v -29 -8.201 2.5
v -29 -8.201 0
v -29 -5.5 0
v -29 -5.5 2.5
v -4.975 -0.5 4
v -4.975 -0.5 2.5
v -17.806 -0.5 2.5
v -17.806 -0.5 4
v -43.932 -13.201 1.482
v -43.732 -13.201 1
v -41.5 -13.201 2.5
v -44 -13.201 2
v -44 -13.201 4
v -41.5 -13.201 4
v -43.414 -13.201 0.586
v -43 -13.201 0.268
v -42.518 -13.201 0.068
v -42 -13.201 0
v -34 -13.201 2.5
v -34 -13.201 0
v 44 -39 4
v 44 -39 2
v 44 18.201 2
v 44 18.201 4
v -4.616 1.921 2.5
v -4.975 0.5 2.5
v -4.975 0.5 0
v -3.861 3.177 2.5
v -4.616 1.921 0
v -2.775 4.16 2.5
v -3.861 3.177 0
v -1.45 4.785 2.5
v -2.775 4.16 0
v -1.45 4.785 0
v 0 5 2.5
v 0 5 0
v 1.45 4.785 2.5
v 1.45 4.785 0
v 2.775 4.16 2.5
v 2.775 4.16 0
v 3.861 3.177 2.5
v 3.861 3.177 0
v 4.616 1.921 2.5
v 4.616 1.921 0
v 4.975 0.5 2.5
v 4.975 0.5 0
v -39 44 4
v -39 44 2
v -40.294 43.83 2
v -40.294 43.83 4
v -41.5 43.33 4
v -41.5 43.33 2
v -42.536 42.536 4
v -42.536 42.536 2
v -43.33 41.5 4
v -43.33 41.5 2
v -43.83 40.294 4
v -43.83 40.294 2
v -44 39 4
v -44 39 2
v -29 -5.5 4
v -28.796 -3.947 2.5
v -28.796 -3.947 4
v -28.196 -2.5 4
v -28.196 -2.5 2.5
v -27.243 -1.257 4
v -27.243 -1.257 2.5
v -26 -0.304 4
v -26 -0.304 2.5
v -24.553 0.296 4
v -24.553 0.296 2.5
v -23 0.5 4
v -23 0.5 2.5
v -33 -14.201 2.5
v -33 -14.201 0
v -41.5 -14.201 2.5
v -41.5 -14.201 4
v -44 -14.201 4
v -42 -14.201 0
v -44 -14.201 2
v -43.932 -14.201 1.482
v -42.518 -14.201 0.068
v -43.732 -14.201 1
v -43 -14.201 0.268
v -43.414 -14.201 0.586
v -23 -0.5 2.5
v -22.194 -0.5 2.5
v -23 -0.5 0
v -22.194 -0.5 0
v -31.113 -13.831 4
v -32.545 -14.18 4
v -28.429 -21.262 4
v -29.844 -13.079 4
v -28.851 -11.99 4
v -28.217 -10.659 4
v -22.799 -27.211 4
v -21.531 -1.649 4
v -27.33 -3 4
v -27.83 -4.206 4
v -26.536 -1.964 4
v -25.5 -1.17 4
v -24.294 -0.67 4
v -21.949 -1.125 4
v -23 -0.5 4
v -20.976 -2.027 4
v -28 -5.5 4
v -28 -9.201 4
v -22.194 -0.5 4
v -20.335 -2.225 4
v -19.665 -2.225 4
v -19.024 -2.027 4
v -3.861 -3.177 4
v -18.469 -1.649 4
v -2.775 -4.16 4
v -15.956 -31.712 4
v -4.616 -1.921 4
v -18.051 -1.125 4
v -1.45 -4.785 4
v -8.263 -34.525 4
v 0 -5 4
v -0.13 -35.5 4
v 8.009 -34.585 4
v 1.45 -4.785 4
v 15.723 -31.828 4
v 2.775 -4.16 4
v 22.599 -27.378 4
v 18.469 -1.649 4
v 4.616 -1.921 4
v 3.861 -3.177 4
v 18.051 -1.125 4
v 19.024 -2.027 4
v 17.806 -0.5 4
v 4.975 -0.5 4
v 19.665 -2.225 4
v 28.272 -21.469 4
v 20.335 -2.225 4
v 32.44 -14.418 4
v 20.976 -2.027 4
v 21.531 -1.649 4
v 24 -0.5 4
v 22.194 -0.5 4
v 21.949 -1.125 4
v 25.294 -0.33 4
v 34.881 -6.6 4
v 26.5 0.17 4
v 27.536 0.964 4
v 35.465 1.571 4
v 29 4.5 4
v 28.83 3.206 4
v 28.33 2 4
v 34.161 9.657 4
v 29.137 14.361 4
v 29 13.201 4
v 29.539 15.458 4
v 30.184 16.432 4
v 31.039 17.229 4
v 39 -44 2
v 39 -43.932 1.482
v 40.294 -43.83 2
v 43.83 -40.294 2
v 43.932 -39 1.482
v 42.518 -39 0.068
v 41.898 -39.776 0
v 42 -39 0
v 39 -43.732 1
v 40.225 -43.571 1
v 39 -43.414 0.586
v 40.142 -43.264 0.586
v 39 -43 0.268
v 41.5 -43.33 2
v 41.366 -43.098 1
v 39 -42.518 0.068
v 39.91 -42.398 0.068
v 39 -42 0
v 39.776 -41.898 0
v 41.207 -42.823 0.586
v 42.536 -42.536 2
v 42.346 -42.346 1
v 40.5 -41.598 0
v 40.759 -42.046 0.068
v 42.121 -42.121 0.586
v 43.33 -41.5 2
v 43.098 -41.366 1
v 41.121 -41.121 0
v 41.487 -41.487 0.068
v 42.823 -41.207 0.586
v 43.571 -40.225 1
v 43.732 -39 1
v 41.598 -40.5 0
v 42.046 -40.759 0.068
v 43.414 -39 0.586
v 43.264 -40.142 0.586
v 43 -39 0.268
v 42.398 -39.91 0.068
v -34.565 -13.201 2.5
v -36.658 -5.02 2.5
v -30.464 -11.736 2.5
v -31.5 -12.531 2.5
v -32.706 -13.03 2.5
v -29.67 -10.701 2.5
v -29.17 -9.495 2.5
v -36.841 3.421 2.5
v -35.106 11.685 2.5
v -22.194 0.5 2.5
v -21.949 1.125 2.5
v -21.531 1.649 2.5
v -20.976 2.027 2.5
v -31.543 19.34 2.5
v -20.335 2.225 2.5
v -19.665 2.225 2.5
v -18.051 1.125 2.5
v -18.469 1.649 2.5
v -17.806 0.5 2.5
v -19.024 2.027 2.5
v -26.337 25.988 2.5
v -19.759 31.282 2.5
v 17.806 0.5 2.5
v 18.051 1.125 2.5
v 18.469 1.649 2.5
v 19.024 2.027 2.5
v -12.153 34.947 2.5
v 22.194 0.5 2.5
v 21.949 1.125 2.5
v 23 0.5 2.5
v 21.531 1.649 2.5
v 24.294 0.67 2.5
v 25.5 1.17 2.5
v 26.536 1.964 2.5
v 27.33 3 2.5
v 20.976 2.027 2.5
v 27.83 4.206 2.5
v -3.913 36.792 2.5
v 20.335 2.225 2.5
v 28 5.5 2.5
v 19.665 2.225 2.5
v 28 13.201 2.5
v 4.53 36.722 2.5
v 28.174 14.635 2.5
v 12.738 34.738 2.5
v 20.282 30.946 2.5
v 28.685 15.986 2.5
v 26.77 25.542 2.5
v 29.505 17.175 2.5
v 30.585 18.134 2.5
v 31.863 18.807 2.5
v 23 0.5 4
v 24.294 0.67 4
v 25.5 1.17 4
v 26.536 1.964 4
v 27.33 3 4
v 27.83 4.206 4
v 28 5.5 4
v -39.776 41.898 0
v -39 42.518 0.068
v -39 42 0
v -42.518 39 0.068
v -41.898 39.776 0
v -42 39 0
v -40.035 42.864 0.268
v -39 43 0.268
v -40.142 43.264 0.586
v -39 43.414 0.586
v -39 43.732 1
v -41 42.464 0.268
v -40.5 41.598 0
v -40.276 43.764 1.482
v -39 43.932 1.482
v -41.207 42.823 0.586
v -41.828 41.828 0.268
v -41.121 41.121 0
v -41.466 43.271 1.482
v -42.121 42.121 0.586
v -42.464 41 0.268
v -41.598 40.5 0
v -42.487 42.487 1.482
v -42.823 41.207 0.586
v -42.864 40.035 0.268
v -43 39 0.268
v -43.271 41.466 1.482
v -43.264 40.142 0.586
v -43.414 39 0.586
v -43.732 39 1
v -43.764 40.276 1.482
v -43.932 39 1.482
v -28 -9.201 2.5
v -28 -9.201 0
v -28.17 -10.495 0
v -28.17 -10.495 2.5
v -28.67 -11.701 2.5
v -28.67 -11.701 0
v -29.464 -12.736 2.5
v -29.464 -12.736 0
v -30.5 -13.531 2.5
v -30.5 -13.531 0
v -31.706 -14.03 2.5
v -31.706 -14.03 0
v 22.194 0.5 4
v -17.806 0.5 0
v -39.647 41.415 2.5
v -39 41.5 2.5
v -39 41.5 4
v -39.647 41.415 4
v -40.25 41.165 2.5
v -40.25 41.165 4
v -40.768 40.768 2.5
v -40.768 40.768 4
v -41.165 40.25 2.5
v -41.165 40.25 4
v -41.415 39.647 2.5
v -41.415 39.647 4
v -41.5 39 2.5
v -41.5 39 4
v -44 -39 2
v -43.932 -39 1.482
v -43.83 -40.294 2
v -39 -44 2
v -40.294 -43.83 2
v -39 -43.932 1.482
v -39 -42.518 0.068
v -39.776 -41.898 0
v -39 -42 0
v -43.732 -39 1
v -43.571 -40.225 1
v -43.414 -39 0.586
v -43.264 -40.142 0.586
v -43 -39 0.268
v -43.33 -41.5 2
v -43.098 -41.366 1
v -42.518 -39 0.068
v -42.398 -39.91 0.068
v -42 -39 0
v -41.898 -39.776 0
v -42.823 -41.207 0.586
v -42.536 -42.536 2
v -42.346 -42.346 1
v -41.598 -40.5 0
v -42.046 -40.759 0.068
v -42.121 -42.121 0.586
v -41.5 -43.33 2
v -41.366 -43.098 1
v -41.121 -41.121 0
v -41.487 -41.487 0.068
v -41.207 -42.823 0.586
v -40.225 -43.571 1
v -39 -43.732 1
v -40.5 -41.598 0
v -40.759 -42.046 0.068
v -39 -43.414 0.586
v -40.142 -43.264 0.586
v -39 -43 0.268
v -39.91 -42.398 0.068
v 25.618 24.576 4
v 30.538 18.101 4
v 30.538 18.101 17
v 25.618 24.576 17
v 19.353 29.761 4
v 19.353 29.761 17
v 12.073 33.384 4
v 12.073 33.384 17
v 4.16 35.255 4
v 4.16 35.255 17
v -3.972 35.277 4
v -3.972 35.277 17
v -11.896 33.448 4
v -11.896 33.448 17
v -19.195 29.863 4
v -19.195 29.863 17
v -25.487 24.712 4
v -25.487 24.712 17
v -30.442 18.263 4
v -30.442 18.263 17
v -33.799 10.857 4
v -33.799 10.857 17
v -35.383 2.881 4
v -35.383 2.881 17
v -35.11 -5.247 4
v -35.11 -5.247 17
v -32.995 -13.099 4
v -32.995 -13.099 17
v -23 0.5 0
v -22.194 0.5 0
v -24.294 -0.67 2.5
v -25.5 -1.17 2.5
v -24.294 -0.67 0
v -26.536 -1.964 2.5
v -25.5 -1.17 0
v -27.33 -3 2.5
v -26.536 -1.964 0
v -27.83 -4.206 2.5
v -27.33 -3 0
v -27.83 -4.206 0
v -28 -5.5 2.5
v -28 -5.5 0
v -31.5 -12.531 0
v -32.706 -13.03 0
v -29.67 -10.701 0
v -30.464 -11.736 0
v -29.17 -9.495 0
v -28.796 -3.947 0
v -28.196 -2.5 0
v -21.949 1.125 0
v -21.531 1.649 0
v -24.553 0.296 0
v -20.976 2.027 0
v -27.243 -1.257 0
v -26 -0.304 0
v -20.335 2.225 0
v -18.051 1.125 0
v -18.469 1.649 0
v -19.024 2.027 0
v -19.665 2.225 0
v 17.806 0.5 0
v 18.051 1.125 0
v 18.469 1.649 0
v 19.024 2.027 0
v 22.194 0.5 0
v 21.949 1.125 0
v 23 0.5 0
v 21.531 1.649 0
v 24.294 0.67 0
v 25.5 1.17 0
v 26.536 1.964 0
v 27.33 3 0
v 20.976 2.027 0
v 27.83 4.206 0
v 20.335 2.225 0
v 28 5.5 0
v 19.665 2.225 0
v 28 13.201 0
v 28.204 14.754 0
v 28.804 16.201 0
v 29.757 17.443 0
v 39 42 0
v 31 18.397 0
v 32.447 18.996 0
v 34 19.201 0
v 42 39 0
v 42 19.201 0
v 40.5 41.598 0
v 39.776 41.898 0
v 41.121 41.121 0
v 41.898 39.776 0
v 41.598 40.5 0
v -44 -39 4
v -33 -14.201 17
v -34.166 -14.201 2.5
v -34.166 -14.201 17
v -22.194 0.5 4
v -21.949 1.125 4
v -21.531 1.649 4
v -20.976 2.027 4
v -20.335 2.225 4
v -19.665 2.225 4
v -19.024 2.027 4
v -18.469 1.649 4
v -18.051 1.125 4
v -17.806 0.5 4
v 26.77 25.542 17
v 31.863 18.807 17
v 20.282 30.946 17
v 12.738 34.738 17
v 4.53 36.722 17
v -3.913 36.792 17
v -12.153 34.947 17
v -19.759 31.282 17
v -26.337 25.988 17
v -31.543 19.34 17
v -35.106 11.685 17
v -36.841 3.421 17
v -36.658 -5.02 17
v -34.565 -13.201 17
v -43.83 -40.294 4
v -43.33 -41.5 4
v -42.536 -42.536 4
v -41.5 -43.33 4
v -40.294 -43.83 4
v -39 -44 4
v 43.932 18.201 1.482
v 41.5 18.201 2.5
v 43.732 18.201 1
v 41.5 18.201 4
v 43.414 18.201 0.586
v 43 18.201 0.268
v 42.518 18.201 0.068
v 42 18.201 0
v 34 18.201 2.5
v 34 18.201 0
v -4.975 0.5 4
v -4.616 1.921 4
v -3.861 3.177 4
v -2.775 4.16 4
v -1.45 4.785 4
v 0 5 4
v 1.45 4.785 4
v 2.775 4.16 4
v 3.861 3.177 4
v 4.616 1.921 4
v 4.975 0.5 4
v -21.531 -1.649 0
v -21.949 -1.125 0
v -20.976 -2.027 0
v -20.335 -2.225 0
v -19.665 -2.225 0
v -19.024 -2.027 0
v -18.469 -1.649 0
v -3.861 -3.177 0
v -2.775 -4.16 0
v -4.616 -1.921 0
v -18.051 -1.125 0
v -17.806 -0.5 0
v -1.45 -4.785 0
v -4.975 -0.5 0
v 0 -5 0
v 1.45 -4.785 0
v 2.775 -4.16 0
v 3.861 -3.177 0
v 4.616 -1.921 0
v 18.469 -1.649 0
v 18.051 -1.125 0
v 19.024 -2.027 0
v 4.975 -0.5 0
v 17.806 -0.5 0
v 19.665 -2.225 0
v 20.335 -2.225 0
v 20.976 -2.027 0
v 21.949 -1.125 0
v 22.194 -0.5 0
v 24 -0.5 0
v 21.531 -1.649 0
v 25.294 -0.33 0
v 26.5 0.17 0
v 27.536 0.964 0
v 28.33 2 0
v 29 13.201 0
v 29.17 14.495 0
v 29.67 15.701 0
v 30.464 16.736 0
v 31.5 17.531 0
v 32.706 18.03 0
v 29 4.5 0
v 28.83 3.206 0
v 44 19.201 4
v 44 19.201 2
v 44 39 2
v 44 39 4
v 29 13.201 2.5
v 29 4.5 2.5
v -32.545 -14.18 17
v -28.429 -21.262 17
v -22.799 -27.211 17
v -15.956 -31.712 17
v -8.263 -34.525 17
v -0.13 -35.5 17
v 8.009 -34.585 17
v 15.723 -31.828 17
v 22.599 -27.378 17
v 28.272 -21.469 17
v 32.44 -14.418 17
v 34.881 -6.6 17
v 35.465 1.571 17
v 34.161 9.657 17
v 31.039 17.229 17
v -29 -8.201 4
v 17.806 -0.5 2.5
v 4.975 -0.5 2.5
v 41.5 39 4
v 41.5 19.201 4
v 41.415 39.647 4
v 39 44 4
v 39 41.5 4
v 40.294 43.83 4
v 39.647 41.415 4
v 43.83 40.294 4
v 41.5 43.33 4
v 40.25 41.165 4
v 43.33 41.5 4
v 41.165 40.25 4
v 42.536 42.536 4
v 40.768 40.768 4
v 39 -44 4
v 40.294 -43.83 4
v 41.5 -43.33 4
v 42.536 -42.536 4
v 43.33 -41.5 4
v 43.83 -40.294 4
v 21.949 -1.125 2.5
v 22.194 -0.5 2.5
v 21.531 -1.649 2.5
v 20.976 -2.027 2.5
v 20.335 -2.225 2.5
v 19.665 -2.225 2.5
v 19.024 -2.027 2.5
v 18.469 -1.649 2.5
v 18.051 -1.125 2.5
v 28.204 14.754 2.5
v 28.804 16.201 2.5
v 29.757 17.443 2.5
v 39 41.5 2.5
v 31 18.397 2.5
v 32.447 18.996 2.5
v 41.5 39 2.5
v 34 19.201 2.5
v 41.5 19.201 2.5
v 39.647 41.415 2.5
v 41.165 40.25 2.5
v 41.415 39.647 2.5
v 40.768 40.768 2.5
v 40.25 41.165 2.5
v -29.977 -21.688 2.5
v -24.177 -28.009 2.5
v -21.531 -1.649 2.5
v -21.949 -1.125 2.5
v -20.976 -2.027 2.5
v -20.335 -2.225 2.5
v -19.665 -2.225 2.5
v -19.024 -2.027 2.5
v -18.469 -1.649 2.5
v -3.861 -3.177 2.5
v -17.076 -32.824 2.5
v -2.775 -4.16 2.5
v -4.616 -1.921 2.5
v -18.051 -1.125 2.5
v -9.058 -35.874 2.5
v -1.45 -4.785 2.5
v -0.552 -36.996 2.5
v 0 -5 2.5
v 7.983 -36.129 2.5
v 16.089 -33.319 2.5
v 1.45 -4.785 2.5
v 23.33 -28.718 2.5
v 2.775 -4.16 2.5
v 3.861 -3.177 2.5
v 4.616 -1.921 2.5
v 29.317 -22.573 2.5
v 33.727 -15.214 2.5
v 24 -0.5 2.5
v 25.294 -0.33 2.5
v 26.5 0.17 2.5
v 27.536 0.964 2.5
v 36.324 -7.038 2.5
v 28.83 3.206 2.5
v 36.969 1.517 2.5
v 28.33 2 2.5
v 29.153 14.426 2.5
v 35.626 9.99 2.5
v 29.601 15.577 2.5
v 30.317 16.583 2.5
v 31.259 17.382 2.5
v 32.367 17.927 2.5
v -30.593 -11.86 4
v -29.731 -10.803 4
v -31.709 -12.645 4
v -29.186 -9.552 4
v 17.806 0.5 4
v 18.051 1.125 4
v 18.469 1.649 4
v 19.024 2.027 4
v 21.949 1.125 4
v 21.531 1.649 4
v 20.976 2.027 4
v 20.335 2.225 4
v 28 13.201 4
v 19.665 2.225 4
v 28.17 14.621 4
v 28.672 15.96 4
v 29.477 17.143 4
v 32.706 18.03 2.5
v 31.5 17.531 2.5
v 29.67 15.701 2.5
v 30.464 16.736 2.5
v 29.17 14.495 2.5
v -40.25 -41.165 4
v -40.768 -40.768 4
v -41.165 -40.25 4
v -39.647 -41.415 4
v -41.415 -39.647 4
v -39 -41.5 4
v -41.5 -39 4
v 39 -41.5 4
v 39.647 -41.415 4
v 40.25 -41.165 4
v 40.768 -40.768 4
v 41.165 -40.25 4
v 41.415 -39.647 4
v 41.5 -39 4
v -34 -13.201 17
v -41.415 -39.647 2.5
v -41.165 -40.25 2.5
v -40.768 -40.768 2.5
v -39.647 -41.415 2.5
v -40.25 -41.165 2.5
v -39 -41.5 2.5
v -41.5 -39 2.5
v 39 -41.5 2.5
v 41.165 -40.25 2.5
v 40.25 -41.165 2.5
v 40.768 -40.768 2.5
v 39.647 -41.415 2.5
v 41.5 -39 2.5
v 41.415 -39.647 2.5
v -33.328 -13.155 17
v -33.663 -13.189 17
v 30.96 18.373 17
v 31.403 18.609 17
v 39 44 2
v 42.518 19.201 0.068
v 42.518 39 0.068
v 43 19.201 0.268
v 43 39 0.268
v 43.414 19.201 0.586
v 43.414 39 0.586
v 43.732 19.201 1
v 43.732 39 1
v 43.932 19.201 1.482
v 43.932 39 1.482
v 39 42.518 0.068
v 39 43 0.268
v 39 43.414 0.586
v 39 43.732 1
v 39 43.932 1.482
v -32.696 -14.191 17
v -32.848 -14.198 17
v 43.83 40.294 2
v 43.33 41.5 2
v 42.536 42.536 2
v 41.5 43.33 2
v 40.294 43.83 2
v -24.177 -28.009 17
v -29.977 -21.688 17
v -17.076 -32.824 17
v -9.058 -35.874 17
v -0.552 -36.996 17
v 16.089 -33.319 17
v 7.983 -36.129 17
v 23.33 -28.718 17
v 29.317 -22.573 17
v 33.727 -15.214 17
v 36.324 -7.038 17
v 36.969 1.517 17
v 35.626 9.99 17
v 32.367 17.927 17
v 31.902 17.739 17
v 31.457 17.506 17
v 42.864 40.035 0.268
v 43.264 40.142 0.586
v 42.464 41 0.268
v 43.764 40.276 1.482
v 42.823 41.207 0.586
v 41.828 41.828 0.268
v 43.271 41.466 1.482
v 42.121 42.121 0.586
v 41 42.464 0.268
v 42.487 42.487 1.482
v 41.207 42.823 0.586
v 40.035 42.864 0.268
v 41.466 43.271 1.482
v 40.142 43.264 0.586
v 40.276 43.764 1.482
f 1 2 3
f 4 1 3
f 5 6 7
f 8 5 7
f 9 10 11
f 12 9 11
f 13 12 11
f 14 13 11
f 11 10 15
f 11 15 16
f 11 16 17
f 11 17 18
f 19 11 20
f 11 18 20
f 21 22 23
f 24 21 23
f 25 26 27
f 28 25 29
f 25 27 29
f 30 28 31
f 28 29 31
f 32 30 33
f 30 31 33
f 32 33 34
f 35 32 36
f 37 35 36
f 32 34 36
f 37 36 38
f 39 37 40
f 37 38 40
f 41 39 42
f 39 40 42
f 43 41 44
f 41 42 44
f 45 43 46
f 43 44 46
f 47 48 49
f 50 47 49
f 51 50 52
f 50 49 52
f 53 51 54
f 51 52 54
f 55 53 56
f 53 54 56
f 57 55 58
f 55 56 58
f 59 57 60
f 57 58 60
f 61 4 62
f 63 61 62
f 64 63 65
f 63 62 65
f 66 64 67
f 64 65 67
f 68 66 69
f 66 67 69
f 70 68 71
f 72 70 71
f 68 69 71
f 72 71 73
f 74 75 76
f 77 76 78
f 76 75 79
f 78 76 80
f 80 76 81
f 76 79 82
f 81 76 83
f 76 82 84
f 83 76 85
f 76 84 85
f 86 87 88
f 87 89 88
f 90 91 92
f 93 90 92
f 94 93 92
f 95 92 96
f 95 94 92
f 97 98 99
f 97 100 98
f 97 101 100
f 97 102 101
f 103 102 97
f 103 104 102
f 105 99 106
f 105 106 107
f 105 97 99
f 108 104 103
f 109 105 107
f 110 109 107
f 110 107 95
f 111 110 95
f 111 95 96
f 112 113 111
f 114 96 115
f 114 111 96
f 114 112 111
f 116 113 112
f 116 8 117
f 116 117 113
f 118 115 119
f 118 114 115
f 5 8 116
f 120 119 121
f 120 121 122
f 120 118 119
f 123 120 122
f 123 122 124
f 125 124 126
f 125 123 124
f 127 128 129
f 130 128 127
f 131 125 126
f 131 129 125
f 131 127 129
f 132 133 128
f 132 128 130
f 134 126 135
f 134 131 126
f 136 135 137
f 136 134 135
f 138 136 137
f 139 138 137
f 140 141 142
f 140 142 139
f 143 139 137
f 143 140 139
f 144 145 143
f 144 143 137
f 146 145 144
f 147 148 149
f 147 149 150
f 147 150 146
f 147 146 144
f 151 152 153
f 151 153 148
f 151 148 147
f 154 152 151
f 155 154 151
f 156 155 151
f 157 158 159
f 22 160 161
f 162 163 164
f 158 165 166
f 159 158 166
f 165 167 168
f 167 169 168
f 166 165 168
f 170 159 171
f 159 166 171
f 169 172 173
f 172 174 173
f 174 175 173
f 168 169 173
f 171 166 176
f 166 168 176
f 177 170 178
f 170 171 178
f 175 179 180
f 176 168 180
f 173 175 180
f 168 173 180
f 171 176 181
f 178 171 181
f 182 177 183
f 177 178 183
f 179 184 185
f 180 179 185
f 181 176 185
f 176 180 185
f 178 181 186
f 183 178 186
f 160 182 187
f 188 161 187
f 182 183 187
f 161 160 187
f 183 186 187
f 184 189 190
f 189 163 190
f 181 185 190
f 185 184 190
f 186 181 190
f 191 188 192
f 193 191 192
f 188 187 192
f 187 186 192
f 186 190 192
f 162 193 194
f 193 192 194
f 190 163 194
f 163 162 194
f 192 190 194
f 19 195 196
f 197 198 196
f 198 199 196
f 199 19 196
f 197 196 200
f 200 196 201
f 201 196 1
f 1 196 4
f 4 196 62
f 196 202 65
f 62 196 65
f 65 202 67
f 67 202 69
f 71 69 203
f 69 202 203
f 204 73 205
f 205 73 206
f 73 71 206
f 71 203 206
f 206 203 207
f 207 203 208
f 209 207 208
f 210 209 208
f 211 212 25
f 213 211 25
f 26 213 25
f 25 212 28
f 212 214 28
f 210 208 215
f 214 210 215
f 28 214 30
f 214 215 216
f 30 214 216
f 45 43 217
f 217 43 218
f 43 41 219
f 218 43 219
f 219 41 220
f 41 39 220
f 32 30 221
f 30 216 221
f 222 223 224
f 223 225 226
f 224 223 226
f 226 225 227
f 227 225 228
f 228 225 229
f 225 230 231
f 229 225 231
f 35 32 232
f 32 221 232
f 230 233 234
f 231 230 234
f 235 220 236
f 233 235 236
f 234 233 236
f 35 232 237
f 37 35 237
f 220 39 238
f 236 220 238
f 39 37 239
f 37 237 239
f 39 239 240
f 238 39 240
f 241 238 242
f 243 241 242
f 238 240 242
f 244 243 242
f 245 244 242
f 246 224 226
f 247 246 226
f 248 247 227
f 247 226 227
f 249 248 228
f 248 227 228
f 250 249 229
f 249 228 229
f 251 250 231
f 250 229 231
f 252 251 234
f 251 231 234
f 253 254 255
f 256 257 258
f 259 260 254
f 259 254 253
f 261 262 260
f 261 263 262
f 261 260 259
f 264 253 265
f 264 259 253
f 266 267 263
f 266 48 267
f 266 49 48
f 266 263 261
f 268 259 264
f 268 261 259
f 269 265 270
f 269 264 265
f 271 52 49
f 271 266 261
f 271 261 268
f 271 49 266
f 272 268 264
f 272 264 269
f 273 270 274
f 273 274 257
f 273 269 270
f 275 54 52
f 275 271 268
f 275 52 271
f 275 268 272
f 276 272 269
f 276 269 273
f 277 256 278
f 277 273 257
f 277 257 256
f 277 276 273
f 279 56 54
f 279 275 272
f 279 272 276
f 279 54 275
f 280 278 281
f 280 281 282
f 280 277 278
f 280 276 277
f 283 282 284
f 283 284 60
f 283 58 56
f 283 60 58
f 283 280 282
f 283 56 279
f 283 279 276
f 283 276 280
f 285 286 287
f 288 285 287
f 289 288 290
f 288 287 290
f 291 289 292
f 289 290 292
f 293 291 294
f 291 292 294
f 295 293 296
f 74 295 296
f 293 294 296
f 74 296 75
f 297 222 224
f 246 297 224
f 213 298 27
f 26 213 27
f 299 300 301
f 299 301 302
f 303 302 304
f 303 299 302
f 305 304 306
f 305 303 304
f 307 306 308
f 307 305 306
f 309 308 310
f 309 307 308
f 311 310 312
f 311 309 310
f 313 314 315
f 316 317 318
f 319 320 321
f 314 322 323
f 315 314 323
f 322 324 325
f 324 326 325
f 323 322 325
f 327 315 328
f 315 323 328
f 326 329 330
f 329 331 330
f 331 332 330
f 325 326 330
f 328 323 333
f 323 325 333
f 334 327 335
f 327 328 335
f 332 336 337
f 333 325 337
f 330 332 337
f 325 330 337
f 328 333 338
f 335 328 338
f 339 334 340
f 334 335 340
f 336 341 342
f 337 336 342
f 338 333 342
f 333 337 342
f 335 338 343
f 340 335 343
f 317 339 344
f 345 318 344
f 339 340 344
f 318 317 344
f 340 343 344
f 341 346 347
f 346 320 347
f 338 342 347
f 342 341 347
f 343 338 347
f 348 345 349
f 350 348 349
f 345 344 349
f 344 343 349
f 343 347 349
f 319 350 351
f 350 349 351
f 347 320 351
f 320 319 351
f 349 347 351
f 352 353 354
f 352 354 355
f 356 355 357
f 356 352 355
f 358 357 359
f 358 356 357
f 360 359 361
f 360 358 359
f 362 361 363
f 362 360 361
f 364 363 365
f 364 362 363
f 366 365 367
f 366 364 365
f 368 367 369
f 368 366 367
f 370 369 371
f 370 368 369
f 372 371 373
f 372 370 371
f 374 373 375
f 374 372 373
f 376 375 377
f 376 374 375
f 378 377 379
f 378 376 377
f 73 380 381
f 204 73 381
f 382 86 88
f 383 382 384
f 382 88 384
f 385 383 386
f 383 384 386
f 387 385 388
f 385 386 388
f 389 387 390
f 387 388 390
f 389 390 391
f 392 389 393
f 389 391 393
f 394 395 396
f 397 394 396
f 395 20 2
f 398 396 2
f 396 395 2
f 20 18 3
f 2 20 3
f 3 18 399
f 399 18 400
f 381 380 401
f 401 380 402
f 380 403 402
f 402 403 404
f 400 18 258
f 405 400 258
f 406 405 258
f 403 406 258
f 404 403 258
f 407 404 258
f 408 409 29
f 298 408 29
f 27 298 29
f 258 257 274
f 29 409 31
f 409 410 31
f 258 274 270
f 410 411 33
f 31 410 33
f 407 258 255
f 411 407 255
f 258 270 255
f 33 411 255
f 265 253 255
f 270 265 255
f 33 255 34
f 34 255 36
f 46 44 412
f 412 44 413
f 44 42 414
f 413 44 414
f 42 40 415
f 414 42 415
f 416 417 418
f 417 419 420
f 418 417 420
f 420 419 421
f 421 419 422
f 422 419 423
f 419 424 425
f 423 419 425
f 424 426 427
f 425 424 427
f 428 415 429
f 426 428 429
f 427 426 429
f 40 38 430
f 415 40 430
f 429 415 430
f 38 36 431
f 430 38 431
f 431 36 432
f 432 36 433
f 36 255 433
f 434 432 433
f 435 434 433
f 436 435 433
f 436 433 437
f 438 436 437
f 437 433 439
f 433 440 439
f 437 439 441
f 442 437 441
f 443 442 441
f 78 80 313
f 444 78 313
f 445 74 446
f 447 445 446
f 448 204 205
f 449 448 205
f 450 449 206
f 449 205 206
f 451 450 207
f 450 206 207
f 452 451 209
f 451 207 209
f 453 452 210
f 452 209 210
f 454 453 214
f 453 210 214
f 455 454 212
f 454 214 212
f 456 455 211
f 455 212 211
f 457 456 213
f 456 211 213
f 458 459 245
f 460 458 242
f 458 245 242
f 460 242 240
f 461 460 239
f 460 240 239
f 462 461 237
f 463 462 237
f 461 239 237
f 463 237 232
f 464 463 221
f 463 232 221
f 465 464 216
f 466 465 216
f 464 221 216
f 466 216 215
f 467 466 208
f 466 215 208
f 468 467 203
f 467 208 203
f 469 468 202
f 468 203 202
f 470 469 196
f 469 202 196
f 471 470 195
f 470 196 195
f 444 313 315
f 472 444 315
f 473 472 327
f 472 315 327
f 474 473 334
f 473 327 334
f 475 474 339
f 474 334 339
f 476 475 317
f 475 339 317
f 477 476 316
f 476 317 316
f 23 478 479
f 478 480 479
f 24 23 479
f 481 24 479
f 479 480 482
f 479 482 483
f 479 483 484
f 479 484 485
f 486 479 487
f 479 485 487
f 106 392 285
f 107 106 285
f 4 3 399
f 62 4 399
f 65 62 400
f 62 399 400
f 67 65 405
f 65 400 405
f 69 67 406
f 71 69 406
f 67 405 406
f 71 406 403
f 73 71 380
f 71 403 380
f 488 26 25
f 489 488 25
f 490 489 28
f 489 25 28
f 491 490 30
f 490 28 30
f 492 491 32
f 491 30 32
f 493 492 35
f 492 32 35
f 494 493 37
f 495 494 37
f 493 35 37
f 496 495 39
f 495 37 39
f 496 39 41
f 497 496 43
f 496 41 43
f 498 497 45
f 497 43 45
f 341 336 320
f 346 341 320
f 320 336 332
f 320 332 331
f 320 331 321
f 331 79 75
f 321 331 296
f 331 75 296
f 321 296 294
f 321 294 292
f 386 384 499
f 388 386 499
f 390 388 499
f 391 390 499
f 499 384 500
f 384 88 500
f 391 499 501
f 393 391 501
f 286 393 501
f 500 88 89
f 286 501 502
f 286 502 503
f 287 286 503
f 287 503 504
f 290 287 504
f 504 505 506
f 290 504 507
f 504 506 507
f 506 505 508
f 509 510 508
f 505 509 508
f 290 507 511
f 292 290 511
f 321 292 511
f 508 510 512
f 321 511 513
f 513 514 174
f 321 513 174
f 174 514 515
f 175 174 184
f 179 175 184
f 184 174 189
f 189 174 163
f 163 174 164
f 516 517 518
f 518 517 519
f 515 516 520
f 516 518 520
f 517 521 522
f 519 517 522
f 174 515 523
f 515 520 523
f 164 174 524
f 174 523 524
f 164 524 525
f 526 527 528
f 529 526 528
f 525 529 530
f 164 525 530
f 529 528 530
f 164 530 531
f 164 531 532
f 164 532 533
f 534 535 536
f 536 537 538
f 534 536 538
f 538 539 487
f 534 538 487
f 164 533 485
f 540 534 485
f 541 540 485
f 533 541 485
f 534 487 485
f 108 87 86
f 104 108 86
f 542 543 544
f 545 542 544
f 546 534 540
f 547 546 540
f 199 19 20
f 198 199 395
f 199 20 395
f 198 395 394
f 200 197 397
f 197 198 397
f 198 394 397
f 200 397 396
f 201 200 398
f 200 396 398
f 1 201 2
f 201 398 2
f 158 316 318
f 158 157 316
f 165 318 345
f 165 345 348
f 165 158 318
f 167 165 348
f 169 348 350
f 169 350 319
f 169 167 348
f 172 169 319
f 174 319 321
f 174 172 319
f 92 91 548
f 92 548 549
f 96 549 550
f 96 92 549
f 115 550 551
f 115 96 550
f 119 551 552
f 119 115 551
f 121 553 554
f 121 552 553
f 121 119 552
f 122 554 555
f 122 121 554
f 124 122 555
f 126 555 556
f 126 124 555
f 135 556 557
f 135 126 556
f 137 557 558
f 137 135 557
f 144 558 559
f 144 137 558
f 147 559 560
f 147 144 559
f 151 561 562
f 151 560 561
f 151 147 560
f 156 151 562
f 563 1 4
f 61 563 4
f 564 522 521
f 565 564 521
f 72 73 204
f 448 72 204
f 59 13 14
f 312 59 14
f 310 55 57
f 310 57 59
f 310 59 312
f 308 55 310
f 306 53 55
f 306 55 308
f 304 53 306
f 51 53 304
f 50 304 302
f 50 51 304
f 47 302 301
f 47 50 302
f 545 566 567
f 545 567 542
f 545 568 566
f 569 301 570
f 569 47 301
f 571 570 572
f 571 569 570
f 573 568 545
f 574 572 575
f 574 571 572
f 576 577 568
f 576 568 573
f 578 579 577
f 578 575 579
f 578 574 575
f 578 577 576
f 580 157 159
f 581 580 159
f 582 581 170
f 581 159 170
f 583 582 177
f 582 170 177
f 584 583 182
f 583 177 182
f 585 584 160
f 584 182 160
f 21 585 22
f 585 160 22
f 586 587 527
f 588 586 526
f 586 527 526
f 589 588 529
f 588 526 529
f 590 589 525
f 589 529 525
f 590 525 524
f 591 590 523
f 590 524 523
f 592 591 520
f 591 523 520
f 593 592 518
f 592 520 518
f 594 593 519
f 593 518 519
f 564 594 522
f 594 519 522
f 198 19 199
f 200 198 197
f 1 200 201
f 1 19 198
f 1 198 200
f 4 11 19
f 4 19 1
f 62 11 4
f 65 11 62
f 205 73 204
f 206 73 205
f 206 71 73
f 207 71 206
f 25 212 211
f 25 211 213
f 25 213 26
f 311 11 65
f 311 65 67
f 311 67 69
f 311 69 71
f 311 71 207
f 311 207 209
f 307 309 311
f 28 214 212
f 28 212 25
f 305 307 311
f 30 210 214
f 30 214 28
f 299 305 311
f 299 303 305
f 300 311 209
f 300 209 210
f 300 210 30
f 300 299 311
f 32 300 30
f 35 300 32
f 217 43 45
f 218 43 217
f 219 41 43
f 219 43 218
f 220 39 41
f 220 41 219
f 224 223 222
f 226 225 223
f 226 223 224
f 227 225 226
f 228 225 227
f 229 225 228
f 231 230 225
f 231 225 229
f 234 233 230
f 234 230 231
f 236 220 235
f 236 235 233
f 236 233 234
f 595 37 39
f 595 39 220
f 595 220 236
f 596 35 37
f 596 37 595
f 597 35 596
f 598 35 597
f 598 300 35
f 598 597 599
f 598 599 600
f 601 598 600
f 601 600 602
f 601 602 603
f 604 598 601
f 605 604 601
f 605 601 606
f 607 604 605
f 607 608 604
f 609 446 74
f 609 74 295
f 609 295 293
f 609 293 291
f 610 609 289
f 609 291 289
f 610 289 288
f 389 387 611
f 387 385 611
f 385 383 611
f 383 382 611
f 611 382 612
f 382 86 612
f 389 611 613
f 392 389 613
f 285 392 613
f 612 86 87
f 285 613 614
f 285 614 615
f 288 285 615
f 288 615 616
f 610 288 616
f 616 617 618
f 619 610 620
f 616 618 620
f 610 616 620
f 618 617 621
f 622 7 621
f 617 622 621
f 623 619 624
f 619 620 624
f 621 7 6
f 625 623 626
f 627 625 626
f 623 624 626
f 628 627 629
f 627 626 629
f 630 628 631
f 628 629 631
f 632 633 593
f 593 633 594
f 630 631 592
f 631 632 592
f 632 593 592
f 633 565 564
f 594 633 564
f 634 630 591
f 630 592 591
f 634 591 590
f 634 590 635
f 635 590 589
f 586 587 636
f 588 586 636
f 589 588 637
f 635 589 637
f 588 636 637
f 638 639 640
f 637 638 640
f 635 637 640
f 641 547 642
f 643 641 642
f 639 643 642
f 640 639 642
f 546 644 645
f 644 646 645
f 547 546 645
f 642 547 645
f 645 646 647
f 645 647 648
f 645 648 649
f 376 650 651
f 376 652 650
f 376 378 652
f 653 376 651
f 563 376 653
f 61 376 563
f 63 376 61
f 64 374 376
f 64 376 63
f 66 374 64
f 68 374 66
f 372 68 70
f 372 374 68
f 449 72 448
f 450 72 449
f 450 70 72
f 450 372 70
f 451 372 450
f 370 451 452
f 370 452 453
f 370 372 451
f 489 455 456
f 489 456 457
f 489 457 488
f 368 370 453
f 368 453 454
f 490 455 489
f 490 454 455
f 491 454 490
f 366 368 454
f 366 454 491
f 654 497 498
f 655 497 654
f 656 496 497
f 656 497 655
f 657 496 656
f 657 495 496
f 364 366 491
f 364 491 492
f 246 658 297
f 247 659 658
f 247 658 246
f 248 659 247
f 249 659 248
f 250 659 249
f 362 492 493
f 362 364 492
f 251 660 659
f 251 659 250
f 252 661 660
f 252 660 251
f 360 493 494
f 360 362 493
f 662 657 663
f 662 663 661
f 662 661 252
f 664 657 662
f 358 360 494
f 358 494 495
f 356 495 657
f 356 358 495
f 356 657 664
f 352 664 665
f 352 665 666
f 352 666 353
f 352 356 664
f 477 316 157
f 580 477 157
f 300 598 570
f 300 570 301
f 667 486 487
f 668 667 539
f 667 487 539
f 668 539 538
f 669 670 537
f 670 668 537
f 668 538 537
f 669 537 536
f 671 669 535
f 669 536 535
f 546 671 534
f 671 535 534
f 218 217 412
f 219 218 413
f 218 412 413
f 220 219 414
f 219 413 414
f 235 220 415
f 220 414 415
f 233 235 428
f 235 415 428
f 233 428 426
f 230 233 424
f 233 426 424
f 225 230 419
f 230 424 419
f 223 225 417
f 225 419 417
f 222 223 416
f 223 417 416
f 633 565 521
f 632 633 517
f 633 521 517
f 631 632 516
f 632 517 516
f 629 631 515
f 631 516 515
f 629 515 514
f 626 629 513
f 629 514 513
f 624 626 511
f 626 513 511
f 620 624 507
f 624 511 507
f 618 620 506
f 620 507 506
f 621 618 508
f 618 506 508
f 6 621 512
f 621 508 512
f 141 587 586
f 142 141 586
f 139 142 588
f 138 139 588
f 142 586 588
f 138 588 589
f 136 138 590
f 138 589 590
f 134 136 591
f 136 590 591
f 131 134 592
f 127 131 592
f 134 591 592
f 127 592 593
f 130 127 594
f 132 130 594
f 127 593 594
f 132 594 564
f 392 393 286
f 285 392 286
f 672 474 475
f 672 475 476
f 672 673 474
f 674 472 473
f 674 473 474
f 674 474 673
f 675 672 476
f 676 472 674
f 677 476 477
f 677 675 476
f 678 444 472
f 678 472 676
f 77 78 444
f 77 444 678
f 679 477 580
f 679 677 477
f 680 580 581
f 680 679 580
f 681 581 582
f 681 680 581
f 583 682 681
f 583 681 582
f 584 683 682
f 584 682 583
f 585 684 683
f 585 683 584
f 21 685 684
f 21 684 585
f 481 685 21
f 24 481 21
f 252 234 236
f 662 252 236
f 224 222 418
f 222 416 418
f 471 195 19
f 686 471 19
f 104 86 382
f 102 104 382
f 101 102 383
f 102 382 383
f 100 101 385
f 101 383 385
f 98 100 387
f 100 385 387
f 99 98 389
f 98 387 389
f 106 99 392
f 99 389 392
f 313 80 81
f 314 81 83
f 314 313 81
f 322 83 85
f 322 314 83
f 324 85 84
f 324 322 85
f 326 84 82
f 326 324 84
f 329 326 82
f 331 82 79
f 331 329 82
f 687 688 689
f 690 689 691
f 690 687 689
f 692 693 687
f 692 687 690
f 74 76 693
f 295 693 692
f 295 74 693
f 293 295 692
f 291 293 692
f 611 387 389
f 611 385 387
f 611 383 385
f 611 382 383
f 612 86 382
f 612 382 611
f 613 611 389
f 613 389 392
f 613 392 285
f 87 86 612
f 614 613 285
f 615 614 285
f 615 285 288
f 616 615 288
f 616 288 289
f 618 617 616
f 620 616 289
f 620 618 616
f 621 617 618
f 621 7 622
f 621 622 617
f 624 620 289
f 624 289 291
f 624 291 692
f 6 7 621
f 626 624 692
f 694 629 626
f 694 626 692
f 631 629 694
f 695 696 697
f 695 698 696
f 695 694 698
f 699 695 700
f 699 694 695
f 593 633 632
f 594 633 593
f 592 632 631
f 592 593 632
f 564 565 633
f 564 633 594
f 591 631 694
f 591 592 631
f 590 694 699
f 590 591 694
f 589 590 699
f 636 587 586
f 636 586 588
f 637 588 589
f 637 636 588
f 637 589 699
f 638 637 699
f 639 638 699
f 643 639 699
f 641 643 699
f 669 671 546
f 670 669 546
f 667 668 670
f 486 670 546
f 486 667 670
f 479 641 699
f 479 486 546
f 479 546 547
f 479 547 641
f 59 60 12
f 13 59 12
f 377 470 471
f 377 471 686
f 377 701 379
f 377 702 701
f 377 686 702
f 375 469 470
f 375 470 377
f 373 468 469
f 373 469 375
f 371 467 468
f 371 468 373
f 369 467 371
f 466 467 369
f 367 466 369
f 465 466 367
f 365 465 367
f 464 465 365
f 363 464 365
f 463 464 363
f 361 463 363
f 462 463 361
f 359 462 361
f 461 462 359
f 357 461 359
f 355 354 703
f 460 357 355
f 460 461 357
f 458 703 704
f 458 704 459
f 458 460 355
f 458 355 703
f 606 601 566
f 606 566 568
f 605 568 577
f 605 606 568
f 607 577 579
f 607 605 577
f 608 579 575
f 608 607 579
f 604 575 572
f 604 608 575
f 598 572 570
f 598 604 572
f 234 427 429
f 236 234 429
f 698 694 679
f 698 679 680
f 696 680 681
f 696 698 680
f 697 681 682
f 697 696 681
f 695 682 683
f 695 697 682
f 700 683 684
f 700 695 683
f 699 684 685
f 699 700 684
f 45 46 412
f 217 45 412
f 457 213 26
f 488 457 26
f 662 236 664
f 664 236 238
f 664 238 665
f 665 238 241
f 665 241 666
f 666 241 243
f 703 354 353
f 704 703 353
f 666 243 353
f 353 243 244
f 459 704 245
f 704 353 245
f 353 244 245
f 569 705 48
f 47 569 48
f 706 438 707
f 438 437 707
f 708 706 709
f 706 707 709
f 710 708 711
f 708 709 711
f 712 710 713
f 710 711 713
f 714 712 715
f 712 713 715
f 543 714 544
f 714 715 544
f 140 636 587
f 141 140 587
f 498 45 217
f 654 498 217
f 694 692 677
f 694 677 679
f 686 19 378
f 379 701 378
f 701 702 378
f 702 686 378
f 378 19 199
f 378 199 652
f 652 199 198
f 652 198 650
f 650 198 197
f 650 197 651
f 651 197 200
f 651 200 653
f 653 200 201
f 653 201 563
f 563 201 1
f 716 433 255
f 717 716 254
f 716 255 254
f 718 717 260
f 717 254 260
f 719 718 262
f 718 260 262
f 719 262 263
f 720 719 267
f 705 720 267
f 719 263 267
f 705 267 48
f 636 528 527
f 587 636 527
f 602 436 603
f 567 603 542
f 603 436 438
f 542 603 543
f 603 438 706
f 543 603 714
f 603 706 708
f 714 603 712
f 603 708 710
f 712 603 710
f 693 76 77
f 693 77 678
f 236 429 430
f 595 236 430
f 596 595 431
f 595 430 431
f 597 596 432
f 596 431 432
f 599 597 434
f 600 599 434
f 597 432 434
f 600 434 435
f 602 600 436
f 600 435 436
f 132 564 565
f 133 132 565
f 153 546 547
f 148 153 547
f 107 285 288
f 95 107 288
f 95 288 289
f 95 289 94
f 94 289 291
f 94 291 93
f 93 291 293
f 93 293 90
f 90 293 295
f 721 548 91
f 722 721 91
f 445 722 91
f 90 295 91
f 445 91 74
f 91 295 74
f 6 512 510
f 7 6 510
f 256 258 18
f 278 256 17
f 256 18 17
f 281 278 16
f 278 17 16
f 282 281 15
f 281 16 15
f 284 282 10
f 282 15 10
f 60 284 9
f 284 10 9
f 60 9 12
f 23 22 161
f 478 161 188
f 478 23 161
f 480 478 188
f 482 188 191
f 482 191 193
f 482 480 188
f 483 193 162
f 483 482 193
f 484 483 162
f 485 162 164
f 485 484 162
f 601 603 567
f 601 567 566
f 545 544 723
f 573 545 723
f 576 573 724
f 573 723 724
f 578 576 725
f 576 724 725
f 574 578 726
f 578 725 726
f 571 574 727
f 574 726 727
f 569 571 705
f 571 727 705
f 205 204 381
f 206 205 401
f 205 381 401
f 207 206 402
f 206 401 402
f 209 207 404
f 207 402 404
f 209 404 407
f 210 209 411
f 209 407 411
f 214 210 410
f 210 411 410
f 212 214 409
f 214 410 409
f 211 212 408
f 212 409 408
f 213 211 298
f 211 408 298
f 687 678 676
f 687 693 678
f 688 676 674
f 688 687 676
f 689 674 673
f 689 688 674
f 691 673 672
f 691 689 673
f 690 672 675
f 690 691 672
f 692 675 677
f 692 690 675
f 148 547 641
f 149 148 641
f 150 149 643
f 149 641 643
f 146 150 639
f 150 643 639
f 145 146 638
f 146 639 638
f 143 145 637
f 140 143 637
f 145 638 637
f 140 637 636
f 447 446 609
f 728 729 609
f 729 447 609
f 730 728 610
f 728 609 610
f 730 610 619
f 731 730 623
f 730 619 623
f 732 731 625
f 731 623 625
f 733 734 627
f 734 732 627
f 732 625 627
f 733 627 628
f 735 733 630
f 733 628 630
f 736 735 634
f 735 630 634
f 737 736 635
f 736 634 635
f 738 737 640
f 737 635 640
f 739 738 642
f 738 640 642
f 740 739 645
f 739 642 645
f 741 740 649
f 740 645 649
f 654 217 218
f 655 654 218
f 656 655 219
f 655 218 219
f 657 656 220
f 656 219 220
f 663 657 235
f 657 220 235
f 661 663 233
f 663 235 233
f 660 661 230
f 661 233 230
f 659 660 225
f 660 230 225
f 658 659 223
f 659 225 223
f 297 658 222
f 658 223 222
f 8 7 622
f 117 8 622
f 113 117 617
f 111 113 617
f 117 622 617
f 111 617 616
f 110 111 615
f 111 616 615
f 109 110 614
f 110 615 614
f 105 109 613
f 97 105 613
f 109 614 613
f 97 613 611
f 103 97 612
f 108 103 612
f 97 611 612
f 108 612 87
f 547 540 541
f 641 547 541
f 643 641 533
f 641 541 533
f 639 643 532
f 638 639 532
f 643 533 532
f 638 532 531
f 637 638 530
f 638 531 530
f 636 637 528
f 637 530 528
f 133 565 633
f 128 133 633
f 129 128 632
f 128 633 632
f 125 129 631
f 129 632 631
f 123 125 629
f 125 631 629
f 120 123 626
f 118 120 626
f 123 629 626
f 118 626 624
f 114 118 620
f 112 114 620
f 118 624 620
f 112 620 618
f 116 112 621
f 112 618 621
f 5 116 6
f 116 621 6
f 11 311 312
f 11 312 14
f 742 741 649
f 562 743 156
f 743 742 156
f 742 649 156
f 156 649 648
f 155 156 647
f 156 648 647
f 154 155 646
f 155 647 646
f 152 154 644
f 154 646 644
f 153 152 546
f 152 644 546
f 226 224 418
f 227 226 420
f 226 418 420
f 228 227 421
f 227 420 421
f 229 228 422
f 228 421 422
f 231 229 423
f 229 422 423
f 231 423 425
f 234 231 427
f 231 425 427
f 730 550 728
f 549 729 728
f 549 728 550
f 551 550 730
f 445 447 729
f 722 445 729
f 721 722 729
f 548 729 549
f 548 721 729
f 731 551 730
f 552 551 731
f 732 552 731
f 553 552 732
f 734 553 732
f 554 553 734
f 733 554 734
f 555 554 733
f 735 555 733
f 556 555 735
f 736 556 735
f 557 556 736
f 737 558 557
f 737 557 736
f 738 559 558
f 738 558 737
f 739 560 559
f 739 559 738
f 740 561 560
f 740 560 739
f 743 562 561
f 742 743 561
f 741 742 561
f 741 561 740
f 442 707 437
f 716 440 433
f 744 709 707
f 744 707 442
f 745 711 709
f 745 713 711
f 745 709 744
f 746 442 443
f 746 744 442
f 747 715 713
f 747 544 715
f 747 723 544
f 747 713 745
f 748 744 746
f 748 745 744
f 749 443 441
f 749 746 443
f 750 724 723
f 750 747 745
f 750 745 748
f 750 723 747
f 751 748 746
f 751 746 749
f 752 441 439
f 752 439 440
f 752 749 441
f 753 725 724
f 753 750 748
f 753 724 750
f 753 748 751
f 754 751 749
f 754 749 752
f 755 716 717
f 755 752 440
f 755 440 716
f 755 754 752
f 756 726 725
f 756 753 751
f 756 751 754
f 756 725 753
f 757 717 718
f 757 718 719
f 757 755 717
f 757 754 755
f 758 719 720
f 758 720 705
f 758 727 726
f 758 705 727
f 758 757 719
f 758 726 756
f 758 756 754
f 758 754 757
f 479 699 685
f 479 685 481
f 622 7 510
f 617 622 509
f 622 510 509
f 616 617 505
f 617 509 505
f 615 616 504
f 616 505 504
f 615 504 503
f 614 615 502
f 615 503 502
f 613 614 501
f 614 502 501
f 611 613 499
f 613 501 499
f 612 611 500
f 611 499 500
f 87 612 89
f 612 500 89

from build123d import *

# Parameters (mm, degrees)
F1_DEPTH = 4
F2_T     = -2.5
F3_R     = 37
F4_DEPTH = 14.5
F5_T     = -1.5
F6_R     = 5
F6_R_2   = 2.25
F7_DEPTH = 17.001
F9_DEPTH = 17.001
F10_R    = 2


with BuildPart() as f1:
    # F0 (on Top) → F1 (new body)
    with BuildSketch(Plane.XY):
        with BuildLine():
            Line((-39, -44), (39, -44))
            ThreePointArc((39, -44), (42.535534, -42.535534), (44, -39))
            Line((44, -39), (44, 39))
            ThreePointArc((44, 39), (42.535534, 42.535534), (39, 44))
            Line((39, 44), (-39, 44))
            ThreePointArc((-39, 44), (-42.535534, 42.535534), (-44, 39))
            Line((-44, 39), (-44, -39))
            ThreePointArc((-44, -39), (-42.535534, -42.535534), (-39, -44))
        make_face()
    extrude(amount=F1_DEPTH)

    # F2
    f2_openings = [f1.faces().sort_by_distance(p)[0] for p in [
        (0, 0, 4),
    ]]
    offset(amount=F2_T, openings=f2_openings)


with BuildPart() as f4:
    # F3 (on face) → F4 (new body)
    with BuildSketch(Plane.XY.offset(2.5)):
        Circle(F3_R)
    extrude(amount=F4_DEPTH)

    # F5
    f5_openings = [f4.faces().sort_by_distance(p)[0] for p in [
        (0, 0, 17),
    ]]
    offset(amount=F5_T, openings=f5_openings)


with BuildPart() as f7_tool:
    # F6 (on face) → F7 (new body, through all)
    with BuildSketch(Plane(origin=(0, 0, 0), x_dir=(1, 0, 0), z_dir=(0, 0, -1))):
        Circle(F6_R)
        with Locations((20, 0)):
            Circle(F6_R_2)
        with Locations((-20, 0)):
            Circle(F6_R_2)
    extrude(amount=-F7_DEPTH)


with BuildPart() as f1_1:
    add(f1.part)

    # F7: cut by f7_tool
    add(f7_tool.part, mode=Mode.SUBTRACT)


with BuildPart() as f4_1:
    add(f4.part)

    # F7: cut by f7_tool
    add(f7_tool.part, mode=Mode.SUBTRACT)


with BuildPart() as f9_tool:
    # F8 (on face) → F9 (new body, through all)
    with BuildSketch(Plane(origin=(0, 0, 0), x_dir=(1, 0, 0), z_dir=(0, 0, -1))):
        with BuildLine():
            Line((50.262612, -18.200689), (34, -18.200689))
            ThreePointArc((34, -18.200689), (30.464466, -16.736223), (29, -13.200689))
            Line((29, -13.200689), (29, -4.5))
            ThreePointArc((29, -4.5), (27.535534, -0.964466), (24, 0.5))
            Line((24, 0.5), (-23, 0.5))
            ThreePointArc((-23, 0.5), (-26.535534, 1.964466), (-28, 5.5))
            Line((-28, 5.5), (-28, 9.200689))
            ThreePointArc((-28, 9.200689), (-29.464466, 12.736223), (-33, 14.200689))
            Line((-33, 14.200689), (-44, 14.200689))
            Line((-44, 14.200689), (-44, 13.200689))
            Line((-44, 13.200689), (-34, 13.200689))
            ThreePointArc((-34, 13.200689), (-30.464466, 11.736223), (-29, 8.200689))
            Line((-29, 8.200689), (-29, 5.5))
            ThreePointArc((-29, 5.5), (-27.242641, 1.257359), (-23, -0.5))
            Line((-23, -0.5), (23, -0.5))
            ThreePointArc((23, -0.5), (26.535534, -1.964466), (28, -5.5))
            Line((28, -5.5), (28, -13.200689))
            ThreePointArc((28, -13.200689), (29.757359, -17.44333), (34, -19.200689))
            Line((34, -19.200689), (50.262612, -19.200689))
            Line((50.262612, -19.200689), (50.262612, -18.200689))
        make_face()
    extrude(amount=-F9_DEPTH)


with BuildPart() as f1_2:
    add(f1_1.part)

    # F9: cut by f9_tool
    add(f9_tool.part, mode=Mode.SUBTRACT)

    # F10
    f10_edges = [f1_2.edges().sort_by_distance(p)[0] for p in [
        (0, -44, 0),
        (-44, 12.899655, 0),
    ]]
    fillet(f10_edges, radius=F10_R)


with BuildPart() as f4_2:
    add(f4_1.part)

    # F9: cut by f9_tool
    add(f9_tool.part, mode=Mode.SUBTRACT)


solid = Compound([f1_2.part, f4_2.part])
